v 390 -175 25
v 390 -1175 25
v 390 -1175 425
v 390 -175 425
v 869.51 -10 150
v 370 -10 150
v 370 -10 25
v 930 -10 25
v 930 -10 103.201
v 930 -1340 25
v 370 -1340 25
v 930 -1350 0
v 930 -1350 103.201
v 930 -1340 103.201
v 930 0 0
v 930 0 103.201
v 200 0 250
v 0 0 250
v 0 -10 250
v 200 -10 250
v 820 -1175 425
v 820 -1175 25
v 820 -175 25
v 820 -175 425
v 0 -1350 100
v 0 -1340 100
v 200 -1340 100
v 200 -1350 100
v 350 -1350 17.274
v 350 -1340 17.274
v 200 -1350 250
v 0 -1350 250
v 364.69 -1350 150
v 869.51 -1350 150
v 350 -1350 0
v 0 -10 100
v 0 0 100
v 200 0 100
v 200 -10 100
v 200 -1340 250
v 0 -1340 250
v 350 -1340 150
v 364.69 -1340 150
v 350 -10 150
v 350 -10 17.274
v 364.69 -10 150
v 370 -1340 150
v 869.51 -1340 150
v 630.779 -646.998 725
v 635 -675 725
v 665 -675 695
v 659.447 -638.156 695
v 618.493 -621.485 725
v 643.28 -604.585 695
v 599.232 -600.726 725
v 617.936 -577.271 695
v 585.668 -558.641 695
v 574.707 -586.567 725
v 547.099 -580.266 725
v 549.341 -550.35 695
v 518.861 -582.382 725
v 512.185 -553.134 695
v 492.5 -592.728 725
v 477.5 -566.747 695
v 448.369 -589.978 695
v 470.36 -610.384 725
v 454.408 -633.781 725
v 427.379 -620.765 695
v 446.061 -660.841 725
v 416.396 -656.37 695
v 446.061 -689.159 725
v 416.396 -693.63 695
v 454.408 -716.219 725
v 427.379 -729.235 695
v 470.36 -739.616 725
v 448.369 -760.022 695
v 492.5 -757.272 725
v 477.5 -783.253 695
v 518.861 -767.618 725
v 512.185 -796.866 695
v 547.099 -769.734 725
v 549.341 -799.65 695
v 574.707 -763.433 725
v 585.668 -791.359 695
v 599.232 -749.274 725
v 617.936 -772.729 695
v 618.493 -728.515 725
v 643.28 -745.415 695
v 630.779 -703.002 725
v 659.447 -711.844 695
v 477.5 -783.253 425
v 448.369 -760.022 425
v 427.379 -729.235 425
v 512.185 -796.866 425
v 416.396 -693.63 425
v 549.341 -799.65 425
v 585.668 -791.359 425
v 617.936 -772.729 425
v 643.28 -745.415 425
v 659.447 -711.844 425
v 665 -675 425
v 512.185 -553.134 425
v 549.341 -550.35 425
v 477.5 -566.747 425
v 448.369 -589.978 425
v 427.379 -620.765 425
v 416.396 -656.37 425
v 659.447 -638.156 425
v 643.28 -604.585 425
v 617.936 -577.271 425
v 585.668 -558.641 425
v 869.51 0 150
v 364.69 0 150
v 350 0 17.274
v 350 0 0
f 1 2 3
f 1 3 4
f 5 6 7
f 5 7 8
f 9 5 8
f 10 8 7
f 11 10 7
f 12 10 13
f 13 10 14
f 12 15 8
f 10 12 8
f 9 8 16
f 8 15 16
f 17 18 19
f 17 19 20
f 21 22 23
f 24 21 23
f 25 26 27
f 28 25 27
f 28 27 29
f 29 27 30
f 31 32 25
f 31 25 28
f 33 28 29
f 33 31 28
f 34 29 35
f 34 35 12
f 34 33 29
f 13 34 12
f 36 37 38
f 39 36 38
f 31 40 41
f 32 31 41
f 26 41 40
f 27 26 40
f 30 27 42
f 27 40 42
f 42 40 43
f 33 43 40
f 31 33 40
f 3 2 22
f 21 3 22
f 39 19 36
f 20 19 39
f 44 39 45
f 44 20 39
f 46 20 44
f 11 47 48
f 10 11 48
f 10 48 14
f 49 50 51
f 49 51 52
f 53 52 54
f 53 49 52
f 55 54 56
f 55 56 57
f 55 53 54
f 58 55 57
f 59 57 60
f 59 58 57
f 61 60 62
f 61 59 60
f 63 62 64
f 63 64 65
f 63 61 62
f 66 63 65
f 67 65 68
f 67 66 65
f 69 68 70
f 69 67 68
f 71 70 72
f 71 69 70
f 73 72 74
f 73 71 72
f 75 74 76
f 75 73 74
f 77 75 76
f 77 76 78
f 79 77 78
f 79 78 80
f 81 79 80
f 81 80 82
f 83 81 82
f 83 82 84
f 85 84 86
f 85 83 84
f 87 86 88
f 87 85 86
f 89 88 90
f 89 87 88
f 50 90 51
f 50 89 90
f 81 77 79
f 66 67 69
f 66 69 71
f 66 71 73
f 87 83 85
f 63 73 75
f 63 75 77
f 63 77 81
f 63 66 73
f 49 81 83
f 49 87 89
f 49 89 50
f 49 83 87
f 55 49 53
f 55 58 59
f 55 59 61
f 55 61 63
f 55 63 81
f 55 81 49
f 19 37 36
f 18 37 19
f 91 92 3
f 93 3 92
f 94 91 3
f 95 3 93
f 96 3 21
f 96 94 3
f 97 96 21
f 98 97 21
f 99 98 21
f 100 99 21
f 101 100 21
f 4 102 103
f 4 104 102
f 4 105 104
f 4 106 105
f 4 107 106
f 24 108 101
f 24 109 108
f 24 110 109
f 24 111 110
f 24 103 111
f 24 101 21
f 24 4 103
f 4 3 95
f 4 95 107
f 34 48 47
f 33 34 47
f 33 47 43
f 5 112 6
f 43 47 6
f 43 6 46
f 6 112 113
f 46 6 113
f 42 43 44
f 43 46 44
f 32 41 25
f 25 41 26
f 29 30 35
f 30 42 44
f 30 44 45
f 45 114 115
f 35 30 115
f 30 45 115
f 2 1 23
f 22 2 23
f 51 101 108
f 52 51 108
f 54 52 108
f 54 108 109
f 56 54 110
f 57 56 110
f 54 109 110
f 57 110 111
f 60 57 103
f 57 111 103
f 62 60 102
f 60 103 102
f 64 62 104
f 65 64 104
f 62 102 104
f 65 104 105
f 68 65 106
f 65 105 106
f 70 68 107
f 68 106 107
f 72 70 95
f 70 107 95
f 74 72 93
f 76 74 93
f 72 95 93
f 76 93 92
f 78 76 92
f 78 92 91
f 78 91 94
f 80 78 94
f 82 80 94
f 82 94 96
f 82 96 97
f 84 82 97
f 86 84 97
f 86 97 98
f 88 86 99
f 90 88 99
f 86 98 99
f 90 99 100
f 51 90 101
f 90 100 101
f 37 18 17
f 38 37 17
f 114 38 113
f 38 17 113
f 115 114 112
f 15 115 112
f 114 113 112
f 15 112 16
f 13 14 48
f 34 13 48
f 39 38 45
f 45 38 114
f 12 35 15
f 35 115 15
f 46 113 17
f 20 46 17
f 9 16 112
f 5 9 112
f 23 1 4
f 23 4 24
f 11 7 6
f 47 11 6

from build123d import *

# Parameters (mm, degrees)
F0_W     = 200
F0_H     = 150
F1_DEPTH = 10
F2_W     = 20
F2_H     = 125
F3_DEPTH = 1330
F5_DEPTH = 10
F6_W     = 430
F6_H     = 1000
F7_DEPTH = 400
F8_R     = 125
F9_DEPTH = 300
F10_SIZE = 30


with BuildPart() as f1:
    # F0 (on Front) → F1 (new body)
    with BuildSketch(Plane.XZ):
        with Locations((100, 175)):
            Rectangle(F0_W, F0_H)
        Polygon((364.690214, 150), (200, 250), (200, 100), (350, 17.274393), (350, 0), (930, 0), (930, 103.201143), (869.509816, 150), align=None)
    extrude(amount=F1_DEPTH)

    # F2 (on face) → F3 (join)
    with BuildSketch(Plane.XZ.offset(10)):
        Polygon((350, 25), (350, 0), (930, 0), (930, 25), (370, 25), align=None)
        with Locations((360, 87.5)):
            Rectangle(F2_W, F2_H)
    extrude(amount=F3_DEPTH)

    # F4 (on face) → F5 (join)
    with BuildSketch(Plane.XZ.offset(1340)):
        Polygon((200, 250), (0, 250), (0, 100), (200, 100), (350, 17.274393), (350, 150), (364.690214, 150), align=None)
        Polygon((370, 150), (364.690214, 150), (350, 150), (350, 17.274393), (350, 0), (930, 0), (930, 25), (370, 25), align=None)
        Polygon((869.509816, 150), (370, 150), (370, 25), (930, 25), (930, 103.201143), align=None)
    extrude(amount=F5_DEPTH)


with BuildPart() as f7:
    # F6 (on face) → F7 (new body)
    with BuildSketch(Plane.XY.offset(25)):
        with Locations((605, -675)):
            Rectangle(F6_W, F6_H)
    extrude(amount=F7_DEPTH)

    # F8 (on face) → F9 (join)
    with BuildSketch(Plane.XY.offset(425)):
        with Locations((540, -675)):
            Circle(F8_R)
    extrude(amount=F9_DEPTH)

    # F10
    f10_edges = [f7.edges().sort_by_distance(p)[0] for p in [
        (415, -675, 725),
    ]]
    chamfer(f10_edges, length=F10_SIZE)


solid = Compound([f1.part, f7.part])
